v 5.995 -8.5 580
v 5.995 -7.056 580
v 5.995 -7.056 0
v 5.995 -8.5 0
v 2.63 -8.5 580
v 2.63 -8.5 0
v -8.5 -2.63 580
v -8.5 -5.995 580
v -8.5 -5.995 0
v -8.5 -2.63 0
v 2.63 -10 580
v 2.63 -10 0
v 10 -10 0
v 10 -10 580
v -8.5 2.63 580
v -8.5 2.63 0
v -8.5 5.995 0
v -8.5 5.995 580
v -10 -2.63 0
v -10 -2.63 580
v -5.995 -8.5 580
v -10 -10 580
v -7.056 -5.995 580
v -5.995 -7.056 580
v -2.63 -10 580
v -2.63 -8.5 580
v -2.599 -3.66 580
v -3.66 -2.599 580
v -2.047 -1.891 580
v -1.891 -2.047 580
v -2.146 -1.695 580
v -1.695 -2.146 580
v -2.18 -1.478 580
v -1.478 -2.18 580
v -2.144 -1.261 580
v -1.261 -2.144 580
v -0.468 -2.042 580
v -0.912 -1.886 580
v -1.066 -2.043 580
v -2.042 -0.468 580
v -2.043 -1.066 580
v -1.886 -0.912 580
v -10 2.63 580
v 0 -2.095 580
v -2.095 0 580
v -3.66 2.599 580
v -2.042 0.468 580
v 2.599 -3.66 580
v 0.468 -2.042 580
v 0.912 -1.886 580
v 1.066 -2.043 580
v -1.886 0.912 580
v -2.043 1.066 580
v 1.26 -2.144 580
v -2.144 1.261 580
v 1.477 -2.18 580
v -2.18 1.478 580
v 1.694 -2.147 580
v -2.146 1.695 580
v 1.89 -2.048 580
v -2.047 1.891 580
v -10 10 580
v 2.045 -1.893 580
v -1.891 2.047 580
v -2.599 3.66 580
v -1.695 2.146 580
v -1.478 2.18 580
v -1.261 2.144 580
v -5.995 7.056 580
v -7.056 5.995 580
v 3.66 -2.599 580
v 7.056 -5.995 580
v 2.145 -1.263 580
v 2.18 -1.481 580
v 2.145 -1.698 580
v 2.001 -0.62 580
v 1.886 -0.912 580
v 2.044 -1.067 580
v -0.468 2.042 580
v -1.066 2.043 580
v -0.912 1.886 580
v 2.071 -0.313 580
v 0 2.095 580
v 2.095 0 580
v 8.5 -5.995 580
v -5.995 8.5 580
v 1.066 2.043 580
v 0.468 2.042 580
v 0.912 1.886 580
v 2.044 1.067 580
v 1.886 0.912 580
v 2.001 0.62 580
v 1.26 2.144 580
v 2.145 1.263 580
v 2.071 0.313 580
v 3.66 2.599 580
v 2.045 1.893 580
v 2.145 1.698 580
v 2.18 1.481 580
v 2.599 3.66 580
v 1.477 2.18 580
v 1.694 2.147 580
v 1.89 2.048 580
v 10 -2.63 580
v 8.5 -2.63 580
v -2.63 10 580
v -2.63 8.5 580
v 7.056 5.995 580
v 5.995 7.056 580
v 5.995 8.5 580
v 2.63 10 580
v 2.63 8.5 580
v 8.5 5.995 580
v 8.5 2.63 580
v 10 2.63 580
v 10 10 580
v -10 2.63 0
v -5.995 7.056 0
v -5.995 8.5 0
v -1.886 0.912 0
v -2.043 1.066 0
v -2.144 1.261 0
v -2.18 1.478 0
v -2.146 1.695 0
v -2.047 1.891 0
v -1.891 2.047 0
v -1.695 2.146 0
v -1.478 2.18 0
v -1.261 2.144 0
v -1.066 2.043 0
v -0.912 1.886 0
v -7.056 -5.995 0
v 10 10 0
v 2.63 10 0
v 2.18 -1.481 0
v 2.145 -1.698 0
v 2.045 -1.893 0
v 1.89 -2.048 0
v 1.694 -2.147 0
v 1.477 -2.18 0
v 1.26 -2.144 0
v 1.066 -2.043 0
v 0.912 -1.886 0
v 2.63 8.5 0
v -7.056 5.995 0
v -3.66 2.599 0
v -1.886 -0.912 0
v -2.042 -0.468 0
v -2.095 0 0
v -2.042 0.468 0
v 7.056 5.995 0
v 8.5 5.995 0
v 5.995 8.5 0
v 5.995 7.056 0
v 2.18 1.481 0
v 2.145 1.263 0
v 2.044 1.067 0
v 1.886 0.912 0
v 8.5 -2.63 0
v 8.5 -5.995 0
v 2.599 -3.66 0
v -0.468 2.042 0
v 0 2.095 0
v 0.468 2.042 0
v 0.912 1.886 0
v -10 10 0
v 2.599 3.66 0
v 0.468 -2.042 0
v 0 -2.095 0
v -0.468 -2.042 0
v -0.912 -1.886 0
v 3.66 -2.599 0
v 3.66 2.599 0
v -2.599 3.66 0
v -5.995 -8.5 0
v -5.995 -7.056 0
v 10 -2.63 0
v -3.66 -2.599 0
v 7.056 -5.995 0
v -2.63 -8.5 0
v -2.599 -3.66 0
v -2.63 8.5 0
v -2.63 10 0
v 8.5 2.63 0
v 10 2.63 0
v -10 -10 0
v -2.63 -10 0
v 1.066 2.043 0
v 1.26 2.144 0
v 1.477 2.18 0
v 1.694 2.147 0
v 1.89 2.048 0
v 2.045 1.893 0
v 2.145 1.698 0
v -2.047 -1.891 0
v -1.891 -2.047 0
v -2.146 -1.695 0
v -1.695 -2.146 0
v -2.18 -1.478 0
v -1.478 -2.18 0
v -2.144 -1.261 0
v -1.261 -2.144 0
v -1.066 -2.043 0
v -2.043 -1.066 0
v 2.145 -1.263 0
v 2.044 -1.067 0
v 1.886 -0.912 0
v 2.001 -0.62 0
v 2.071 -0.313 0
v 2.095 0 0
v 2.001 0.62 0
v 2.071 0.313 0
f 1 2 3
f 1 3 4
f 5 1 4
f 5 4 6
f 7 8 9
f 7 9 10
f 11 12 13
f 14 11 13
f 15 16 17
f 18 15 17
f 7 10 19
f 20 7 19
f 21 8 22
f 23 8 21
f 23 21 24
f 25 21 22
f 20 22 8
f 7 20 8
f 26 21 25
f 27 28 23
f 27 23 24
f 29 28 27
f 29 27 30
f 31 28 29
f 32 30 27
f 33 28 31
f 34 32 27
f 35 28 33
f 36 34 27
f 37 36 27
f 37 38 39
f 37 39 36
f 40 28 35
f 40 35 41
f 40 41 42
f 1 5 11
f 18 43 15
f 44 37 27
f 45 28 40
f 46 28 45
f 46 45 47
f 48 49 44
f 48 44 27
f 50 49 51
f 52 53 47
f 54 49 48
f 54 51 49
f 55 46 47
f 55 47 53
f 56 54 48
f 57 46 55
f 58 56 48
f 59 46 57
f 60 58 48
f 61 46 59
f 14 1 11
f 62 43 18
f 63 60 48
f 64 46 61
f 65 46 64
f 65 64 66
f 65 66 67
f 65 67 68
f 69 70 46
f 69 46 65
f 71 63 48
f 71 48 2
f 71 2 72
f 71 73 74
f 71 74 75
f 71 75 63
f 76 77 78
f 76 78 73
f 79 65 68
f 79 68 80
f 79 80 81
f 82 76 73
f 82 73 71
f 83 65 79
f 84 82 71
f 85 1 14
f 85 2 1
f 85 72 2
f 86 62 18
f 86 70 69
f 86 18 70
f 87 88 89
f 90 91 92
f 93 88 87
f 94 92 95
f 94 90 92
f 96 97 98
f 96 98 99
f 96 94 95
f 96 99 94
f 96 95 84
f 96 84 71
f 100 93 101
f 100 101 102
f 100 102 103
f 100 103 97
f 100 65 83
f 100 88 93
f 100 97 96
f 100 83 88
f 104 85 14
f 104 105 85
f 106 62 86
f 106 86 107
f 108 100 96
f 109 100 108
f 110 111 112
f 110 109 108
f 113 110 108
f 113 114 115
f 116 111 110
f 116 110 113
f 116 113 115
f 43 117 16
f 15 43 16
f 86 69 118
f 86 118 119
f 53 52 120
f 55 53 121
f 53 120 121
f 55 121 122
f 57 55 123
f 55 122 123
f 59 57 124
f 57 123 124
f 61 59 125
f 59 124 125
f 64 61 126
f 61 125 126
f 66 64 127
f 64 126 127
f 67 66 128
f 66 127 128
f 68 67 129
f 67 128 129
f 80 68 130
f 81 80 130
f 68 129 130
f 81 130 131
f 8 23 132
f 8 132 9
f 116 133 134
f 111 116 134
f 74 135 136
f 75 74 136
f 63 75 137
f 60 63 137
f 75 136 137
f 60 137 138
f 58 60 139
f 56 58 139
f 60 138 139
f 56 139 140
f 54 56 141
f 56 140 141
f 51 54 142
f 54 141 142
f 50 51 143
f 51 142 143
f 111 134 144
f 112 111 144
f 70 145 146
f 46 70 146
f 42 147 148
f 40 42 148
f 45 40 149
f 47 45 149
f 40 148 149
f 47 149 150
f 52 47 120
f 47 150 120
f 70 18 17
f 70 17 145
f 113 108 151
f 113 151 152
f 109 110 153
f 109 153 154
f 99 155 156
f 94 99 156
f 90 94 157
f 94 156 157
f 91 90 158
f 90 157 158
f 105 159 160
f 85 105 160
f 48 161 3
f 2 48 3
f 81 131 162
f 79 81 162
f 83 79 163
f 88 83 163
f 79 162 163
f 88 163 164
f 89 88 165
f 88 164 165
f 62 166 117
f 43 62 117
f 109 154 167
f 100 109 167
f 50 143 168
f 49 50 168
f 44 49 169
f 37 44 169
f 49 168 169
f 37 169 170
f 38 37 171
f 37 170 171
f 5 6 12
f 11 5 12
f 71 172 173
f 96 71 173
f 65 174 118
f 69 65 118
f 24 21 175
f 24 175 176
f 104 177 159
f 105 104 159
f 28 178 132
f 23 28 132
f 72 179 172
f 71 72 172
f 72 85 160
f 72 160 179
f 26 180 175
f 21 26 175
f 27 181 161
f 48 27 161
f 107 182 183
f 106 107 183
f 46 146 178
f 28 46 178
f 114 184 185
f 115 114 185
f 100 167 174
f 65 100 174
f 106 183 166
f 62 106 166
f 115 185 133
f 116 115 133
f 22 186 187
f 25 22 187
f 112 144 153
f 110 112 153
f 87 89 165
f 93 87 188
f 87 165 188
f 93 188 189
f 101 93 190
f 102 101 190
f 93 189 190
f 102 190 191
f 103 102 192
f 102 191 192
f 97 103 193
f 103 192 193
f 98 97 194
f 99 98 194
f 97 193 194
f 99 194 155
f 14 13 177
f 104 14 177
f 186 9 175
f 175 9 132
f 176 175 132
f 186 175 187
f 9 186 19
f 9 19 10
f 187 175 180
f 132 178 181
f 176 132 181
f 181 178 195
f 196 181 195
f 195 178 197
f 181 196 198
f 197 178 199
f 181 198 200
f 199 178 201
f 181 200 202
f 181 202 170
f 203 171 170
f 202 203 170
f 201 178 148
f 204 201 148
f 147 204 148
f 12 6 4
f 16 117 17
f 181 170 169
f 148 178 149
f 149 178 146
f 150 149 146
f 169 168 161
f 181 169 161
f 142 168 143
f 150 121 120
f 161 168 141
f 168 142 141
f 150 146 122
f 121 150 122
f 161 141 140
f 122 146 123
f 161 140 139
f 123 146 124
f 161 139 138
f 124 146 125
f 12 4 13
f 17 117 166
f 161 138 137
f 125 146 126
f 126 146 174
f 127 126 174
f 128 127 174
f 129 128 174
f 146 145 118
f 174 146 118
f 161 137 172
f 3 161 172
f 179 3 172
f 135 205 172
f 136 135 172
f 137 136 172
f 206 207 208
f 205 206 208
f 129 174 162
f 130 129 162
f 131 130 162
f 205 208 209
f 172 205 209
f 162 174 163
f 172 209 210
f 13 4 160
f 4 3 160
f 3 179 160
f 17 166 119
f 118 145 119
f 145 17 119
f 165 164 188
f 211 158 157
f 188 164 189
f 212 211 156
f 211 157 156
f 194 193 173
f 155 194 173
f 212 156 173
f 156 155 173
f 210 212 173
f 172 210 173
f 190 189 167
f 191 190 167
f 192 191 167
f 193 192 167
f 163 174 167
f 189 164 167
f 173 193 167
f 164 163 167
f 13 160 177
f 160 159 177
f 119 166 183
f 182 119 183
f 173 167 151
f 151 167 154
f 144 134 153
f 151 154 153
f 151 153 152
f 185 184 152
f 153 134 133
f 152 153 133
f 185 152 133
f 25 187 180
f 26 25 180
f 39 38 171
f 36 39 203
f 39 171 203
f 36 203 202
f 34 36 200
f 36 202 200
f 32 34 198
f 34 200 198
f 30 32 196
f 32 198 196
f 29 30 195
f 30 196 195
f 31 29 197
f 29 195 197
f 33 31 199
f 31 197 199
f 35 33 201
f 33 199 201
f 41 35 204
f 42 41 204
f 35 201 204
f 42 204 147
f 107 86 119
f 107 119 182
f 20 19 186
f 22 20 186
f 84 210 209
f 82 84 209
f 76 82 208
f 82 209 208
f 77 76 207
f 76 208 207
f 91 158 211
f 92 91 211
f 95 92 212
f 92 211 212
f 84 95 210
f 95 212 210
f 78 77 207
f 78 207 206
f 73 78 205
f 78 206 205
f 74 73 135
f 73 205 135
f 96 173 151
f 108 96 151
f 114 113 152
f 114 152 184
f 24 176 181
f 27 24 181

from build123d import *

# Parameters (mm, degrees)
F1_DEPTH = 580


with BuildPart() as f1:
    # F0 (on Top) → F1 (new body)
    with BuildSketch(Plane.XY):
        Polygon((10, 2.63), (10, 10), (2.63, 10), (2.63, 8.5), (5.995, 8.5), (5.995, 7.05566), (2.59934, 3.66), (-2.59934, 3.66), (-5.995, 7.05566), (-5.995, 8.5), (-2.63, 8.5), (-2.63, 10), (-10, 10), (-10, 2.63), (-8.5, 2.63), (-8.5, 5.995), (-7.05566, 5.995), (-3.66, 2.59934), (-3.66, -2.59934), (-7.05566, -5.995), (-8.5, -5.995), (-8.5, -2.63), (-10, -2.63), (-10, -10), (-2.63, -10), (-2.63, -8.5), (-5.995, -8.5), (-5.995, -7.05566), (-2.59934, -3.66), (2.59934, -3.66), (5.995, -7.05566), (5.995, -8.5), (2.63, -8.5), (2.63, -10), (10, -10), (10, -2.63), (8.5, -2.63), (8.5, -5.995), (7.05566, -5.995), (3.66, -2.59934), (3.66, 2.59934), (7.05566, 5.995), (8.5, 5.995), (8.5, 2.63), align=None)
        with BuildLine():
            ThreePointArc((1.886053, 0.912048), (2.042095, 0.467838), (2.095, 0))
            ThreePointArc((2.095, 0), (2.042095, -0.467838), (1.886053, -0.912048))
            ThreePointArc((1.886053, -0.912048), (2.102098, -1.161042), (2.179889, -1.481389))
            ThreePointArc((2.179889, -1.481389), (1.693777, -2.146816), (0.912048, -1.886053))
            ThreePointArc((0.912048, -1.886053), (0, -2.095), (-0.912048, -1.886053))
            ThreePointArc((-0.912048, -1.886053), (-1.975303, -1.975303), (-1.886053, -0.912048))
            ThreePointArc((-1.886053, -0.912048), (-2.095, 0), (-1.886053, 0.912048))
            ThreePointArc((-1.886053, 0.912048), (-1.975303, 1.975303), (-0.912048, 1.886053))
            ThreePointArc((-0.912048, 1.886053), (0, 2.095), (0.912048, 1.886053))
            ThreePointArc((0.912048, 1.886053), (1.693777, 2.146816), (2.179889, 1.481389))
            ThreePointArc((2.179889, 1.481389), (2.102098, 1.161042), (1.886053, 0.912048))
        make_face(mode=Mode.SUBTRACT)
    extrude(amount=F1_DEPTH)


solid = f1.part
